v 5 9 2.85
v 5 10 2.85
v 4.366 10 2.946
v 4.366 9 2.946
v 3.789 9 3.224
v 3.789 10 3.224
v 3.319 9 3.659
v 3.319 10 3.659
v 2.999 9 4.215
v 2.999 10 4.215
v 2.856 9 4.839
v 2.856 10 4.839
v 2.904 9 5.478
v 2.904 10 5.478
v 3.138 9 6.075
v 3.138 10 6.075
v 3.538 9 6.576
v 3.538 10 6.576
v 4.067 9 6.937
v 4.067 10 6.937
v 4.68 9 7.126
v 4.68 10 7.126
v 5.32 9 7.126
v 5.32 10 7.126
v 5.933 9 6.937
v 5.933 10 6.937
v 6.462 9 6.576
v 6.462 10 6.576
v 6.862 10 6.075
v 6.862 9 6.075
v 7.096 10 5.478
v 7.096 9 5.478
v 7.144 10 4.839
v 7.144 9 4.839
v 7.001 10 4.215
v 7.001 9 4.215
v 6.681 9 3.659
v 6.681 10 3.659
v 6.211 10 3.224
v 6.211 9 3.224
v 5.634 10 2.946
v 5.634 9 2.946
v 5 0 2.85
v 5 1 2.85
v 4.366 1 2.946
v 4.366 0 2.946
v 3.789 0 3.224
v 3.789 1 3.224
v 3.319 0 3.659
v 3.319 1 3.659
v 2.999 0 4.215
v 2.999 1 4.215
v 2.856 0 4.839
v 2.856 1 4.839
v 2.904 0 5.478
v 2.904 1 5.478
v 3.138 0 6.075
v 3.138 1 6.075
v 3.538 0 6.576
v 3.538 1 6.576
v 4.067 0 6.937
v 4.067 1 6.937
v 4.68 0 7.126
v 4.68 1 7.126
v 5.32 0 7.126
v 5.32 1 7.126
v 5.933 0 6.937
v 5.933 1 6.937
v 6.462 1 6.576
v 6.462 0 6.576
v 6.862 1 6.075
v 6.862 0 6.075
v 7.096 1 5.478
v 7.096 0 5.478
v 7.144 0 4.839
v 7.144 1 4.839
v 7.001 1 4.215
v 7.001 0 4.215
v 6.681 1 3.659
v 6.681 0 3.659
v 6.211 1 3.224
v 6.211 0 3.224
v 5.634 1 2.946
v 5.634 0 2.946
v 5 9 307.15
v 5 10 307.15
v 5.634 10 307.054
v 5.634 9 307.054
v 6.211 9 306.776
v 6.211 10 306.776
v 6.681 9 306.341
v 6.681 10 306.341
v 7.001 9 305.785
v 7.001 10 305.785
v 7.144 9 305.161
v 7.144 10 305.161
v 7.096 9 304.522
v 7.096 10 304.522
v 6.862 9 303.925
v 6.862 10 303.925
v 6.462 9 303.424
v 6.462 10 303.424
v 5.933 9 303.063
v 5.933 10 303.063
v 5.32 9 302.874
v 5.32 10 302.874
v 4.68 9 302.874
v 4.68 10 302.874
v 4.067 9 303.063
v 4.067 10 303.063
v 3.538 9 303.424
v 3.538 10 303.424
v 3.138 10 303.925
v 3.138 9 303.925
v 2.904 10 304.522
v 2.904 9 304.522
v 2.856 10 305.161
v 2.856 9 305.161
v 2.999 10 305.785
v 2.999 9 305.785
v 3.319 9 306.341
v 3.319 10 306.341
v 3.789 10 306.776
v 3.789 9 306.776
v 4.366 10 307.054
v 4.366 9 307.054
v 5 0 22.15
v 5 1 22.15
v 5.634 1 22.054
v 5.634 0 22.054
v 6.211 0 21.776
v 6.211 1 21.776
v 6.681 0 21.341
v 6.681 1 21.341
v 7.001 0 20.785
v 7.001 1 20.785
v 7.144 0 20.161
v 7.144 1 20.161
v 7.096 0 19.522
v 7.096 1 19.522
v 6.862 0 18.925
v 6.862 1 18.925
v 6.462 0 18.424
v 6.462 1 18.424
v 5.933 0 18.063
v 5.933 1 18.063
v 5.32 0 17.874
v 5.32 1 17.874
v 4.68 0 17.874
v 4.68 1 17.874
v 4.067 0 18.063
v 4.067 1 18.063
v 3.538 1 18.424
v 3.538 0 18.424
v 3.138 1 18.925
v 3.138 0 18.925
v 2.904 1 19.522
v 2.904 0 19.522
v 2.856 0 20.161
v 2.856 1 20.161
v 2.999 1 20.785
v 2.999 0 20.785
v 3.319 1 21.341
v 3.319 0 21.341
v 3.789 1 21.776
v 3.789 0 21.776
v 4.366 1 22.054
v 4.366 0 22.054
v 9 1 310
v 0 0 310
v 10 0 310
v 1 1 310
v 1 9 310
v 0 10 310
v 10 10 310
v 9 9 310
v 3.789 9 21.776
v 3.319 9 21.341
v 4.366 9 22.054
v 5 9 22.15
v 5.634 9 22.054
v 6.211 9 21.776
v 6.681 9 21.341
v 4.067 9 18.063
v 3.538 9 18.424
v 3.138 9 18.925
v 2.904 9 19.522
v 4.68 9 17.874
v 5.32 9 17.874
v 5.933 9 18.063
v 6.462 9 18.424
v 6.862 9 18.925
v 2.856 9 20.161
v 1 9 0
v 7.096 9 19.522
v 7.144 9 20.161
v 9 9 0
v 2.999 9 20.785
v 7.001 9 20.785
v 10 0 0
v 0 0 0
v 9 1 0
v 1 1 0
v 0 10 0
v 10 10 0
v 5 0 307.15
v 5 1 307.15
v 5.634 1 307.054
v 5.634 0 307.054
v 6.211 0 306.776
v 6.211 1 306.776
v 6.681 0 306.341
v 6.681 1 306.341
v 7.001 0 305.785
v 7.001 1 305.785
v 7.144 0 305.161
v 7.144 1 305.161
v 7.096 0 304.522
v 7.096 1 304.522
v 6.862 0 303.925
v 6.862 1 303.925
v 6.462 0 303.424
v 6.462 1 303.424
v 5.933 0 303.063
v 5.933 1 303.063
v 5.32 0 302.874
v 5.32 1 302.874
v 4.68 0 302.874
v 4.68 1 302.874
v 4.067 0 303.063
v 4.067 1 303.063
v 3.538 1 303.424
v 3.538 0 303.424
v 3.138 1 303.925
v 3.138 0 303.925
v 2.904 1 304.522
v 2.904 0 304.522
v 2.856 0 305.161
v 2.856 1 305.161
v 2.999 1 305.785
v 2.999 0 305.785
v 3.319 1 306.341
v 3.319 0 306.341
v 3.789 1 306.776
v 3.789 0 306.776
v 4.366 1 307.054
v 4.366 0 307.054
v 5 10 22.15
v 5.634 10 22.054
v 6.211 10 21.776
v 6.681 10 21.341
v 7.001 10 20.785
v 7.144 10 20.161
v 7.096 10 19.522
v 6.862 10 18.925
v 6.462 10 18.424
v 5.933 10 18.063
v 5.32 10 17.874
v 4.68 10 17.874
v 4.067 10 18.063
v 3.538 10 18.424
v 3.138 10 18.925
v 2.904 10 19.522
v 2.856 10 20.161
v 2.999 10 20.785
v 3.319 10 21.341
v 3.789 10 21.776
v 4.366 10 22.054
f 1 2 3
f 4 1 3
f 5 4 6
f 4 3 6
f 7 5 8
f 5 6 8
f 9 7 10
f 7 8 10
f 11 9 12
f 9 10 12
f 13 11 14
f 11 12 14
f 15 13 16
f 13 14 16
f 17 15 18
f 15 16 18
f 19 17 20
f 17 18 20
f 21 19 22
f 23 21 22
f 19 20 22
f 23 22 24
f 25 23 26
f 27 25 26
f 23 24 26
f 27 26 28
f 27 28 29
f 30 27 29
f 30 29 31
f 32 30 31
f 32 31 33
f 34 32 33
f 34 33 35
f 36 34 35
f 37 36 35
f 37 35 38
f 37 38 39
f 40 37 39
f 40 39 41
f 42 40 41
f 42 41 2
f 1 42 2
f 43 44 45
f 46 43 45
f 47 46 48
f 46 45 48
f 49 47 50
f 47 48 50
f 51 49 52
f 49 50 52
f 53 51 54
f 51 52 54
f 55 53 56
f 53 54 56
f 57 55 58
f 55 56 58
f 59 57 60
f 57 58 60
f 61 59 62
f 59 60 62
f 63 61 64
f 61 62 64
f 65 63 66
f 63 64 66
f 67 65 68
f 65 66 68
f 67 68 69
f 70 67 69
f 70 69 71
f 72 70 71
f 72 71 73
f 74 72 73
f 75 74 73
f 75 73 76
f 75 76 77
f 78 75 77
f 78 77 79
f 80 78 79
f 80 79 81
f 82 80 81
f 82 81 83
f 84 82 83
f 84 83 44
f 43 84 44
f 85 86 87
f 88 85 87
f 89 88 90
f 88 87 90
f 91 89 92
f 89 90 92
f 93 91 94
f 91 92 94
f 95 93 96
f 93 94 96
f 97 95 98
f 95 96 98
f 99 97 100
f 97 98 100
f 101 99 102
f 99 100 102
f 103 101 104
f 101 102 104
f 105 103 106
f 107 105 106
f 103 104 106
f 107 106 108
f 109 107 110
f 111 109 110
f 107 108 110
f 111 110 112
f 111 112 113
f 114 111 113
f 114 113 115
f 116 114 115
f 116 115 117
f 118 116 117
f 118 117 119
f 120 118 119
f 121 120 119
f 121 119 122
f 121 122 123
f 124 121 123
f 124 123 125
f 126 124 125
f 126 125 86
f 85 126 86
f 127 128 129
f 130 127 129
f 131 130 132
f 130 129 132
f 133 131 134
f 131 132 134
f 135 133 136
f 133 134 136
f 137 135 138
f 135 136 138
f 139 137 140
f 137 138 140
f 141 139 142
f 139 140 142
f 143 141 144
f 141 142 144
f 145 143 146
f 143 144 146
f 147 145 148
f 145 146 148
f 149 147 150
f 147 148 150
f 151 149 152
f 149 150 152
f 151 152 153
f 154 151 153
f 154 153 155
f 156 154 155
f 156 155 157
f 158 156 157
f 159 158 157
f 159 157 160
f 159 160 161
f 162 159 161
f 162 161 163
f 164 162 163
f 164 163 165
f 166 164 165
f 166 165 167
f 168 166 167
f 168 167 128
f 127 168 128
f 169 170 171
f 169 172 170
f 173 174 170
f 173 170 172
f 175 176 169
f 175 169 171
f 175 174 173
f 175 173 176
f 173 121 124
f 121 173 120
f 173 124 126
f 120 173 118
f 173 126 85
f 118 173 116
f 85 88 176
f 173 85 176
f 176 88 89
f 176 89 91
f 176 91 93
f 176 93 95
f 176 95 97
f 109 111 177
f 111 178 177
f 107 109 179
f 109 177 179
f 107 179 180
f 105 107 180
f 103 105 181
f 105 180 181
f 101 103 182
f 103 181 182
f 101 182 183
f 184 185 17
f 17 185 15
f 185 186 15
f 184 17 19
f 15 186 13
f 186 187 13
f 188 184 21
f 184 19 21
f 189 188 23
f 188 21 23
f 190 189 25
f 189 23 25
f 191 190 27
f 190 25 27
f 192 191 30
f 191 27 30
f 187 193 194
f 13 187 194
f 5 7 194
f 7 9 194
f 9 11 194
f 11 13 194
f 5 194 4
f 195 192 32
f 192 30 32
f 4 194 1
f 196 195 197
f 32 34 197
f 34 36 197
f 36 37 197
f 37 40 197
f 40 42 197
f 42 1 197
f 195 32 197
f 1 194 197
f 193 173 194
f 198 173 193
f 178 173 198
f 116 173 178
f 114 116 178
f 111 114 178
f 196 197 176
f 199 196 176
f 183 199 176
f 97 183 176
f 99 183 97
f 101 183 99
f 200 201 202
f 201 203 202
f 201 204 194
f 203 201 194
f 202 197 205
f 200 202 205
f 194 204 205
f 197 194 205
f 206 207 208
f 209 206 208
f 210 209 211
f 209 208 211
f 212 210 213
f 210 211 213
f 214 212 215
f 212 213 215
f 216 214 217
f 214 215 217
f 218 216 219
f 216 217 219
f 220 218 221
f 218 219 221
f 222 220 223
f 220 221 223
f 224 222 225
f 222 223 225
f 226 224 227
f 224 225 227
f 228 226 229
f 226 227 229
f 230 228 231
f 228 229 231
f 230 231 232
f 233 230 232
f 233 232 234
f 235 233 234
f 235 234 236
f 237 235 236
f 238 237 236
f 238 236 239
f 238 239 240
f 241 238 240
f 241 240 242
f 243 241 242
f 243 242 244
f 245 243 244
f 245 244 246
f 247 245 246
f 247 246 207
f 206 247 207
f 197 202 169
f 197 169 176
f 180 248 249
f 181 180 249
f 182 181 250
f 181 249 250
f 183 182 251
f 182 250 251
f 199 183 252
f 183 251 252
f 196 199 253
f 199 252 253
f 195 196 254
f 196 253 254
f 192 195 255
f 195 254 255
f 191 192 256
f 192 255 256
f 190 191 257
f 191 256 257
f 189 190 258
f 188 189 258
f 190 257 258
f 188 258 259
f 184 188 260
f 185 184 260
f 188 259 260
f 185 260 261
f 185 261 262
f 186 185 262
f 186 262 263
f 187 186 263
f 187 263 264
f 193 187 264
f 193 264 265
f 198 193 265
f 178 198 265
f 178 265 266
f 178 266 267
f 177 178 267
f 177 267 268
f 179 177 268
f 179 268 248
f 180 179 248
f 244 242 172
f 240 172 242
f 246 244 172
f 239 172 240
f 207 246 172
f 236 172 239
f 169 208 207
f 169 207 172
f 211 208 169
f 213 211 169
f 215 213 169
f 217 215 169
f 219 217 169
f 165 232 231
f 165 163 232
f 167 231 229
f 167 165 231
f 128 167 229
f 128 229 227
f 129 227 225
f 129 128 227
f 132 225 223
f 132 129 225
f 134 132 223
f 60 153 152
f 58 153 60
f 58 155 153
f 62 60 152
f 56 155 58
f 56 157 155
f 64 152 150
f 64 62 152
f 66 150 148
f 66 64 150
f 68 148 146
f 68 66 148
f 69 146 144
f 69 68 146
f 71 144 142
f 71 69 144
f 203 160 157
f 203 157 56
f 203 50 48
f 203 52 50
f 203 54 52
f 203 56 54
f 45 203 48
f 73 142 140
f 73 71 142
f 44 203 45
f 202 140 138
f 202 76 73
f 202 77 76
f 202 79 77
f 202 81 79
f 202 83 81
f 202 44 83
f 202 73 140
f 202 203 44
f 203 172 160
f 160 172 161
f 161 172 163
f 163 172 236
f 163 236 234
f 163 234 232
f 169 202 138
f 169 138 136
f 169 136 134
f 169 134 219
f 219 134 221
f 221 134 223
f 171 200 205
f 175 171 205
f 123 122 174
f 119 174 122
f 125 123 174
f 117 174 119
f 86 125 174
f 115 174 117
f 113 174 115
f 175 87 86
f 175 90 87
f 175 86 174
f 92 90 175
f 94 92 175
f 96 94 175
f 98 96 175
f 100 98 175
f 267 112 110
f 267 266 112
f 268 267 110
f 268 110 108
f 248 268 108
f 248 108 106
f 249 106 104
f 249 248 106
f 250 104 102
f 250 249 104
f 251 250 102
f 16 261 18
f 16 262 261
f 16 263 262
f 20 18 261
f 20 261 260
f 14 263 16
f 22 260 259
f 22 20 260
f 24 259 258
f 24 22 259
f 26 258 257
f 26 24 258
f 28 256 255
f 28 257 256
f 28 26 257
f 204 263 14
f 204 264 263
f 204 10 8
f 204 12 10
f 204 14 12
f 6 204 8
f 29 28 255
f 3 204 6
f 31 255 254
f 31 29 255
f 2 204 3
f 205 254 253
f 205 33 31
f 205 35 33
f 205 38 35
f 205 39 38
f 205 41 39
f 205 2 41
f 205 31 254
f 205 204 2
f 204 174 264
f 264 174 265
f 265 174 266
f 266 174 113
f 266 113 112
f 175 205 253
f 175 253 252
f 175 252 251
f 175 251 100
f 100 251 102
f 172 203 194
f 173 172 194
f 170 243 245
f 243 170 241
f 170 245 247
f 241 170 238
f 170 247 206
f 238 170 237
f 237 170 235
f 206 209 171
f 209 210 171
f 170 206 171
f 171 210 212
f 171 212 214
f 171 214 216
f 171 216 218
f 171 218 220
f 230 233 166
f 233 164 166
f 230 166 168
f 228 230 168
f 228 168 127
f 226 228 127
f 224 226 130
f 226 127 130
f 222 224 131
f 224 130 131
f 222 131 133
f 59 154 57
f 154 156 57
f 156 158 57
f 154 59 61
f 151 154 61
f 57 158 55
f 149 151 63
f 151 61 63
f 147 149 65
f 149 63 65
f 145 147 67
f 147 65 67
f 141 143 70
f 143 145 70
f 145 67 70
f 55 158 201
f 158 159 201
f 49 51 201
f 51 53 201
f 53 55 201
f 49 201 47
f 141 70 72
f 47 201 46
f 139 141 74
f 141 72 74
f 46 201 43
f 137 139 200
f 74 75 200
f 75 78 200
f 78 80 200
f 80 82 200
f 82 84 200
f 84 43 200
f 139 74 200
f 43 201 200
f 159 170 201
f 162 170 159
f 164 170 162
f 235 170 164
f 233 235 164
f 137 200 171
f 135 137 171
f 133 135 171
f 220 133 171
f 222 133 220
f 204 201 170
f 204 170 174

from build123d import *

# Parameters (mm, degrees)
SKETCH_2_W          = 10
SKETCH_2_H          = 10
SKETCH_2_W_2        = 8
SKETCH_2_H_2        = 8
EXTRUDE_1_DEPTH     = 310
CUT_EXTRUDE_1_REACH = 312.322
SKETCH_3_R          = 2.15


with BuildPart() as part:
    # ｽｹｯﾁ2 → 押し出し-薄板1 (new body)
    with BuildSketch(Plane.XY):
        with Locations((5, 5)):
            Rectangle(SKETCH_2_W, SKETCH_2_H)
        with Locations((5, 5)):
            Rectangle(SKETCH_2_W_2, SKETCH_2_H_2, mode=Mode.SUBTRACT)
    extrude(amount=EXTRUDE_1_DEPTH)

    # ｶｯﾄ - 押し出し1: up to this face of the body (flat: up to its plane)
    cut_extrude_1_end = Plane(part.part.faces().sort_by_distance((5, 0, 155))[0])
    # ｽｹｯﾁ3 → ｶｯﾄ - 押し出し1 (cut, up to the picked face)
    with BuildSketch(Plane(origin=(0, 10, 0), x_dir=(1, 0, 0), z_dir=(0, 1, 0)), mode=Mode.PRIVATE) as cut_extrude_1_sk1:
        with Locations(Location((5, -305, 0), (0, 0, 270))):
            Circle(SKETCH_3_R)
    cut_extrude_1_tool1 = split(extrude(cut_extrude_1_sk1.sketch, amount=-CUT_EXTRUDE_1_REACH, mode=Mode.PRIVATE), bisect_by=cut_extrude_1_end, keep=Keep.BOTH, mode=Mode.PRIVATE)
    # ｽｹｯﾁ3 → ｶｯﾄ - 押し出し1 (cut, up to the picked face)
    with BuildSketch(Plane(origin=(0, 10, 0), x_dir=(1, 0, 0), z_dir=(0, 1, 0)), mode=Mode.PRIVATE) as cut_extrude_1_sk2:
        with Locations(Location((5, -5, 0), (0, 0, 90))):
            Circle(SKETCH_3_R)
    cut_extrude_1_tool2 = split(extrude(cut_extrude_1_sk2.sketch, amount=-CUT_EXTRUDE_1_REACH, mode=Mode.PRIVATE), bisect_by=cut_extrude_1_end, keep=Keep.BOTH, mode=Mode.PRIVATE)
    # ｽｹｯﾁ3 → ｶｯﾄ - 押し出し1 (cut, up to the picked face)
    with BuildSketch(Plane(origin=(0, 10, 0), x_dir=(1, 0, 0), z_dir=(0, 1, 0)), mode=Mode.PRIVATE) as cut_extrude_1_sk3:
        with Locations(Location((5, -20, 0), (0, 0, 270))):
            Circle(SKETCH_3_R)
    cut_extrude_1_tool3 = split(extrude(cut_extrude_1_sk3.sketch, amount=-CUT_EXTRUDE_1_REACH, mode=Mode.PRIVATE), bisect_by=cut_extrude_1_end, keep=Keep.BOTH, mode=Mode.PRIVATE)
    add(cut_extrude_1_tool1.solids().sort_by(Axis((5, 10, 305), (0, -1, 0)))[0], mode=Mode.SUBTRACT)
    add(cut_extrude_1_tool2.solids().sort_by(Axis((5, 10, 5), (0, -1, 0)))[0], mode=Mode.SUBTRACT)
    add(cut_extrude_1_tool3.solids().sort_by(Axis((5, 10, 20), (0, -1, 0)))[0], mode=Mode.SUBTRACT)


solid = part.part
